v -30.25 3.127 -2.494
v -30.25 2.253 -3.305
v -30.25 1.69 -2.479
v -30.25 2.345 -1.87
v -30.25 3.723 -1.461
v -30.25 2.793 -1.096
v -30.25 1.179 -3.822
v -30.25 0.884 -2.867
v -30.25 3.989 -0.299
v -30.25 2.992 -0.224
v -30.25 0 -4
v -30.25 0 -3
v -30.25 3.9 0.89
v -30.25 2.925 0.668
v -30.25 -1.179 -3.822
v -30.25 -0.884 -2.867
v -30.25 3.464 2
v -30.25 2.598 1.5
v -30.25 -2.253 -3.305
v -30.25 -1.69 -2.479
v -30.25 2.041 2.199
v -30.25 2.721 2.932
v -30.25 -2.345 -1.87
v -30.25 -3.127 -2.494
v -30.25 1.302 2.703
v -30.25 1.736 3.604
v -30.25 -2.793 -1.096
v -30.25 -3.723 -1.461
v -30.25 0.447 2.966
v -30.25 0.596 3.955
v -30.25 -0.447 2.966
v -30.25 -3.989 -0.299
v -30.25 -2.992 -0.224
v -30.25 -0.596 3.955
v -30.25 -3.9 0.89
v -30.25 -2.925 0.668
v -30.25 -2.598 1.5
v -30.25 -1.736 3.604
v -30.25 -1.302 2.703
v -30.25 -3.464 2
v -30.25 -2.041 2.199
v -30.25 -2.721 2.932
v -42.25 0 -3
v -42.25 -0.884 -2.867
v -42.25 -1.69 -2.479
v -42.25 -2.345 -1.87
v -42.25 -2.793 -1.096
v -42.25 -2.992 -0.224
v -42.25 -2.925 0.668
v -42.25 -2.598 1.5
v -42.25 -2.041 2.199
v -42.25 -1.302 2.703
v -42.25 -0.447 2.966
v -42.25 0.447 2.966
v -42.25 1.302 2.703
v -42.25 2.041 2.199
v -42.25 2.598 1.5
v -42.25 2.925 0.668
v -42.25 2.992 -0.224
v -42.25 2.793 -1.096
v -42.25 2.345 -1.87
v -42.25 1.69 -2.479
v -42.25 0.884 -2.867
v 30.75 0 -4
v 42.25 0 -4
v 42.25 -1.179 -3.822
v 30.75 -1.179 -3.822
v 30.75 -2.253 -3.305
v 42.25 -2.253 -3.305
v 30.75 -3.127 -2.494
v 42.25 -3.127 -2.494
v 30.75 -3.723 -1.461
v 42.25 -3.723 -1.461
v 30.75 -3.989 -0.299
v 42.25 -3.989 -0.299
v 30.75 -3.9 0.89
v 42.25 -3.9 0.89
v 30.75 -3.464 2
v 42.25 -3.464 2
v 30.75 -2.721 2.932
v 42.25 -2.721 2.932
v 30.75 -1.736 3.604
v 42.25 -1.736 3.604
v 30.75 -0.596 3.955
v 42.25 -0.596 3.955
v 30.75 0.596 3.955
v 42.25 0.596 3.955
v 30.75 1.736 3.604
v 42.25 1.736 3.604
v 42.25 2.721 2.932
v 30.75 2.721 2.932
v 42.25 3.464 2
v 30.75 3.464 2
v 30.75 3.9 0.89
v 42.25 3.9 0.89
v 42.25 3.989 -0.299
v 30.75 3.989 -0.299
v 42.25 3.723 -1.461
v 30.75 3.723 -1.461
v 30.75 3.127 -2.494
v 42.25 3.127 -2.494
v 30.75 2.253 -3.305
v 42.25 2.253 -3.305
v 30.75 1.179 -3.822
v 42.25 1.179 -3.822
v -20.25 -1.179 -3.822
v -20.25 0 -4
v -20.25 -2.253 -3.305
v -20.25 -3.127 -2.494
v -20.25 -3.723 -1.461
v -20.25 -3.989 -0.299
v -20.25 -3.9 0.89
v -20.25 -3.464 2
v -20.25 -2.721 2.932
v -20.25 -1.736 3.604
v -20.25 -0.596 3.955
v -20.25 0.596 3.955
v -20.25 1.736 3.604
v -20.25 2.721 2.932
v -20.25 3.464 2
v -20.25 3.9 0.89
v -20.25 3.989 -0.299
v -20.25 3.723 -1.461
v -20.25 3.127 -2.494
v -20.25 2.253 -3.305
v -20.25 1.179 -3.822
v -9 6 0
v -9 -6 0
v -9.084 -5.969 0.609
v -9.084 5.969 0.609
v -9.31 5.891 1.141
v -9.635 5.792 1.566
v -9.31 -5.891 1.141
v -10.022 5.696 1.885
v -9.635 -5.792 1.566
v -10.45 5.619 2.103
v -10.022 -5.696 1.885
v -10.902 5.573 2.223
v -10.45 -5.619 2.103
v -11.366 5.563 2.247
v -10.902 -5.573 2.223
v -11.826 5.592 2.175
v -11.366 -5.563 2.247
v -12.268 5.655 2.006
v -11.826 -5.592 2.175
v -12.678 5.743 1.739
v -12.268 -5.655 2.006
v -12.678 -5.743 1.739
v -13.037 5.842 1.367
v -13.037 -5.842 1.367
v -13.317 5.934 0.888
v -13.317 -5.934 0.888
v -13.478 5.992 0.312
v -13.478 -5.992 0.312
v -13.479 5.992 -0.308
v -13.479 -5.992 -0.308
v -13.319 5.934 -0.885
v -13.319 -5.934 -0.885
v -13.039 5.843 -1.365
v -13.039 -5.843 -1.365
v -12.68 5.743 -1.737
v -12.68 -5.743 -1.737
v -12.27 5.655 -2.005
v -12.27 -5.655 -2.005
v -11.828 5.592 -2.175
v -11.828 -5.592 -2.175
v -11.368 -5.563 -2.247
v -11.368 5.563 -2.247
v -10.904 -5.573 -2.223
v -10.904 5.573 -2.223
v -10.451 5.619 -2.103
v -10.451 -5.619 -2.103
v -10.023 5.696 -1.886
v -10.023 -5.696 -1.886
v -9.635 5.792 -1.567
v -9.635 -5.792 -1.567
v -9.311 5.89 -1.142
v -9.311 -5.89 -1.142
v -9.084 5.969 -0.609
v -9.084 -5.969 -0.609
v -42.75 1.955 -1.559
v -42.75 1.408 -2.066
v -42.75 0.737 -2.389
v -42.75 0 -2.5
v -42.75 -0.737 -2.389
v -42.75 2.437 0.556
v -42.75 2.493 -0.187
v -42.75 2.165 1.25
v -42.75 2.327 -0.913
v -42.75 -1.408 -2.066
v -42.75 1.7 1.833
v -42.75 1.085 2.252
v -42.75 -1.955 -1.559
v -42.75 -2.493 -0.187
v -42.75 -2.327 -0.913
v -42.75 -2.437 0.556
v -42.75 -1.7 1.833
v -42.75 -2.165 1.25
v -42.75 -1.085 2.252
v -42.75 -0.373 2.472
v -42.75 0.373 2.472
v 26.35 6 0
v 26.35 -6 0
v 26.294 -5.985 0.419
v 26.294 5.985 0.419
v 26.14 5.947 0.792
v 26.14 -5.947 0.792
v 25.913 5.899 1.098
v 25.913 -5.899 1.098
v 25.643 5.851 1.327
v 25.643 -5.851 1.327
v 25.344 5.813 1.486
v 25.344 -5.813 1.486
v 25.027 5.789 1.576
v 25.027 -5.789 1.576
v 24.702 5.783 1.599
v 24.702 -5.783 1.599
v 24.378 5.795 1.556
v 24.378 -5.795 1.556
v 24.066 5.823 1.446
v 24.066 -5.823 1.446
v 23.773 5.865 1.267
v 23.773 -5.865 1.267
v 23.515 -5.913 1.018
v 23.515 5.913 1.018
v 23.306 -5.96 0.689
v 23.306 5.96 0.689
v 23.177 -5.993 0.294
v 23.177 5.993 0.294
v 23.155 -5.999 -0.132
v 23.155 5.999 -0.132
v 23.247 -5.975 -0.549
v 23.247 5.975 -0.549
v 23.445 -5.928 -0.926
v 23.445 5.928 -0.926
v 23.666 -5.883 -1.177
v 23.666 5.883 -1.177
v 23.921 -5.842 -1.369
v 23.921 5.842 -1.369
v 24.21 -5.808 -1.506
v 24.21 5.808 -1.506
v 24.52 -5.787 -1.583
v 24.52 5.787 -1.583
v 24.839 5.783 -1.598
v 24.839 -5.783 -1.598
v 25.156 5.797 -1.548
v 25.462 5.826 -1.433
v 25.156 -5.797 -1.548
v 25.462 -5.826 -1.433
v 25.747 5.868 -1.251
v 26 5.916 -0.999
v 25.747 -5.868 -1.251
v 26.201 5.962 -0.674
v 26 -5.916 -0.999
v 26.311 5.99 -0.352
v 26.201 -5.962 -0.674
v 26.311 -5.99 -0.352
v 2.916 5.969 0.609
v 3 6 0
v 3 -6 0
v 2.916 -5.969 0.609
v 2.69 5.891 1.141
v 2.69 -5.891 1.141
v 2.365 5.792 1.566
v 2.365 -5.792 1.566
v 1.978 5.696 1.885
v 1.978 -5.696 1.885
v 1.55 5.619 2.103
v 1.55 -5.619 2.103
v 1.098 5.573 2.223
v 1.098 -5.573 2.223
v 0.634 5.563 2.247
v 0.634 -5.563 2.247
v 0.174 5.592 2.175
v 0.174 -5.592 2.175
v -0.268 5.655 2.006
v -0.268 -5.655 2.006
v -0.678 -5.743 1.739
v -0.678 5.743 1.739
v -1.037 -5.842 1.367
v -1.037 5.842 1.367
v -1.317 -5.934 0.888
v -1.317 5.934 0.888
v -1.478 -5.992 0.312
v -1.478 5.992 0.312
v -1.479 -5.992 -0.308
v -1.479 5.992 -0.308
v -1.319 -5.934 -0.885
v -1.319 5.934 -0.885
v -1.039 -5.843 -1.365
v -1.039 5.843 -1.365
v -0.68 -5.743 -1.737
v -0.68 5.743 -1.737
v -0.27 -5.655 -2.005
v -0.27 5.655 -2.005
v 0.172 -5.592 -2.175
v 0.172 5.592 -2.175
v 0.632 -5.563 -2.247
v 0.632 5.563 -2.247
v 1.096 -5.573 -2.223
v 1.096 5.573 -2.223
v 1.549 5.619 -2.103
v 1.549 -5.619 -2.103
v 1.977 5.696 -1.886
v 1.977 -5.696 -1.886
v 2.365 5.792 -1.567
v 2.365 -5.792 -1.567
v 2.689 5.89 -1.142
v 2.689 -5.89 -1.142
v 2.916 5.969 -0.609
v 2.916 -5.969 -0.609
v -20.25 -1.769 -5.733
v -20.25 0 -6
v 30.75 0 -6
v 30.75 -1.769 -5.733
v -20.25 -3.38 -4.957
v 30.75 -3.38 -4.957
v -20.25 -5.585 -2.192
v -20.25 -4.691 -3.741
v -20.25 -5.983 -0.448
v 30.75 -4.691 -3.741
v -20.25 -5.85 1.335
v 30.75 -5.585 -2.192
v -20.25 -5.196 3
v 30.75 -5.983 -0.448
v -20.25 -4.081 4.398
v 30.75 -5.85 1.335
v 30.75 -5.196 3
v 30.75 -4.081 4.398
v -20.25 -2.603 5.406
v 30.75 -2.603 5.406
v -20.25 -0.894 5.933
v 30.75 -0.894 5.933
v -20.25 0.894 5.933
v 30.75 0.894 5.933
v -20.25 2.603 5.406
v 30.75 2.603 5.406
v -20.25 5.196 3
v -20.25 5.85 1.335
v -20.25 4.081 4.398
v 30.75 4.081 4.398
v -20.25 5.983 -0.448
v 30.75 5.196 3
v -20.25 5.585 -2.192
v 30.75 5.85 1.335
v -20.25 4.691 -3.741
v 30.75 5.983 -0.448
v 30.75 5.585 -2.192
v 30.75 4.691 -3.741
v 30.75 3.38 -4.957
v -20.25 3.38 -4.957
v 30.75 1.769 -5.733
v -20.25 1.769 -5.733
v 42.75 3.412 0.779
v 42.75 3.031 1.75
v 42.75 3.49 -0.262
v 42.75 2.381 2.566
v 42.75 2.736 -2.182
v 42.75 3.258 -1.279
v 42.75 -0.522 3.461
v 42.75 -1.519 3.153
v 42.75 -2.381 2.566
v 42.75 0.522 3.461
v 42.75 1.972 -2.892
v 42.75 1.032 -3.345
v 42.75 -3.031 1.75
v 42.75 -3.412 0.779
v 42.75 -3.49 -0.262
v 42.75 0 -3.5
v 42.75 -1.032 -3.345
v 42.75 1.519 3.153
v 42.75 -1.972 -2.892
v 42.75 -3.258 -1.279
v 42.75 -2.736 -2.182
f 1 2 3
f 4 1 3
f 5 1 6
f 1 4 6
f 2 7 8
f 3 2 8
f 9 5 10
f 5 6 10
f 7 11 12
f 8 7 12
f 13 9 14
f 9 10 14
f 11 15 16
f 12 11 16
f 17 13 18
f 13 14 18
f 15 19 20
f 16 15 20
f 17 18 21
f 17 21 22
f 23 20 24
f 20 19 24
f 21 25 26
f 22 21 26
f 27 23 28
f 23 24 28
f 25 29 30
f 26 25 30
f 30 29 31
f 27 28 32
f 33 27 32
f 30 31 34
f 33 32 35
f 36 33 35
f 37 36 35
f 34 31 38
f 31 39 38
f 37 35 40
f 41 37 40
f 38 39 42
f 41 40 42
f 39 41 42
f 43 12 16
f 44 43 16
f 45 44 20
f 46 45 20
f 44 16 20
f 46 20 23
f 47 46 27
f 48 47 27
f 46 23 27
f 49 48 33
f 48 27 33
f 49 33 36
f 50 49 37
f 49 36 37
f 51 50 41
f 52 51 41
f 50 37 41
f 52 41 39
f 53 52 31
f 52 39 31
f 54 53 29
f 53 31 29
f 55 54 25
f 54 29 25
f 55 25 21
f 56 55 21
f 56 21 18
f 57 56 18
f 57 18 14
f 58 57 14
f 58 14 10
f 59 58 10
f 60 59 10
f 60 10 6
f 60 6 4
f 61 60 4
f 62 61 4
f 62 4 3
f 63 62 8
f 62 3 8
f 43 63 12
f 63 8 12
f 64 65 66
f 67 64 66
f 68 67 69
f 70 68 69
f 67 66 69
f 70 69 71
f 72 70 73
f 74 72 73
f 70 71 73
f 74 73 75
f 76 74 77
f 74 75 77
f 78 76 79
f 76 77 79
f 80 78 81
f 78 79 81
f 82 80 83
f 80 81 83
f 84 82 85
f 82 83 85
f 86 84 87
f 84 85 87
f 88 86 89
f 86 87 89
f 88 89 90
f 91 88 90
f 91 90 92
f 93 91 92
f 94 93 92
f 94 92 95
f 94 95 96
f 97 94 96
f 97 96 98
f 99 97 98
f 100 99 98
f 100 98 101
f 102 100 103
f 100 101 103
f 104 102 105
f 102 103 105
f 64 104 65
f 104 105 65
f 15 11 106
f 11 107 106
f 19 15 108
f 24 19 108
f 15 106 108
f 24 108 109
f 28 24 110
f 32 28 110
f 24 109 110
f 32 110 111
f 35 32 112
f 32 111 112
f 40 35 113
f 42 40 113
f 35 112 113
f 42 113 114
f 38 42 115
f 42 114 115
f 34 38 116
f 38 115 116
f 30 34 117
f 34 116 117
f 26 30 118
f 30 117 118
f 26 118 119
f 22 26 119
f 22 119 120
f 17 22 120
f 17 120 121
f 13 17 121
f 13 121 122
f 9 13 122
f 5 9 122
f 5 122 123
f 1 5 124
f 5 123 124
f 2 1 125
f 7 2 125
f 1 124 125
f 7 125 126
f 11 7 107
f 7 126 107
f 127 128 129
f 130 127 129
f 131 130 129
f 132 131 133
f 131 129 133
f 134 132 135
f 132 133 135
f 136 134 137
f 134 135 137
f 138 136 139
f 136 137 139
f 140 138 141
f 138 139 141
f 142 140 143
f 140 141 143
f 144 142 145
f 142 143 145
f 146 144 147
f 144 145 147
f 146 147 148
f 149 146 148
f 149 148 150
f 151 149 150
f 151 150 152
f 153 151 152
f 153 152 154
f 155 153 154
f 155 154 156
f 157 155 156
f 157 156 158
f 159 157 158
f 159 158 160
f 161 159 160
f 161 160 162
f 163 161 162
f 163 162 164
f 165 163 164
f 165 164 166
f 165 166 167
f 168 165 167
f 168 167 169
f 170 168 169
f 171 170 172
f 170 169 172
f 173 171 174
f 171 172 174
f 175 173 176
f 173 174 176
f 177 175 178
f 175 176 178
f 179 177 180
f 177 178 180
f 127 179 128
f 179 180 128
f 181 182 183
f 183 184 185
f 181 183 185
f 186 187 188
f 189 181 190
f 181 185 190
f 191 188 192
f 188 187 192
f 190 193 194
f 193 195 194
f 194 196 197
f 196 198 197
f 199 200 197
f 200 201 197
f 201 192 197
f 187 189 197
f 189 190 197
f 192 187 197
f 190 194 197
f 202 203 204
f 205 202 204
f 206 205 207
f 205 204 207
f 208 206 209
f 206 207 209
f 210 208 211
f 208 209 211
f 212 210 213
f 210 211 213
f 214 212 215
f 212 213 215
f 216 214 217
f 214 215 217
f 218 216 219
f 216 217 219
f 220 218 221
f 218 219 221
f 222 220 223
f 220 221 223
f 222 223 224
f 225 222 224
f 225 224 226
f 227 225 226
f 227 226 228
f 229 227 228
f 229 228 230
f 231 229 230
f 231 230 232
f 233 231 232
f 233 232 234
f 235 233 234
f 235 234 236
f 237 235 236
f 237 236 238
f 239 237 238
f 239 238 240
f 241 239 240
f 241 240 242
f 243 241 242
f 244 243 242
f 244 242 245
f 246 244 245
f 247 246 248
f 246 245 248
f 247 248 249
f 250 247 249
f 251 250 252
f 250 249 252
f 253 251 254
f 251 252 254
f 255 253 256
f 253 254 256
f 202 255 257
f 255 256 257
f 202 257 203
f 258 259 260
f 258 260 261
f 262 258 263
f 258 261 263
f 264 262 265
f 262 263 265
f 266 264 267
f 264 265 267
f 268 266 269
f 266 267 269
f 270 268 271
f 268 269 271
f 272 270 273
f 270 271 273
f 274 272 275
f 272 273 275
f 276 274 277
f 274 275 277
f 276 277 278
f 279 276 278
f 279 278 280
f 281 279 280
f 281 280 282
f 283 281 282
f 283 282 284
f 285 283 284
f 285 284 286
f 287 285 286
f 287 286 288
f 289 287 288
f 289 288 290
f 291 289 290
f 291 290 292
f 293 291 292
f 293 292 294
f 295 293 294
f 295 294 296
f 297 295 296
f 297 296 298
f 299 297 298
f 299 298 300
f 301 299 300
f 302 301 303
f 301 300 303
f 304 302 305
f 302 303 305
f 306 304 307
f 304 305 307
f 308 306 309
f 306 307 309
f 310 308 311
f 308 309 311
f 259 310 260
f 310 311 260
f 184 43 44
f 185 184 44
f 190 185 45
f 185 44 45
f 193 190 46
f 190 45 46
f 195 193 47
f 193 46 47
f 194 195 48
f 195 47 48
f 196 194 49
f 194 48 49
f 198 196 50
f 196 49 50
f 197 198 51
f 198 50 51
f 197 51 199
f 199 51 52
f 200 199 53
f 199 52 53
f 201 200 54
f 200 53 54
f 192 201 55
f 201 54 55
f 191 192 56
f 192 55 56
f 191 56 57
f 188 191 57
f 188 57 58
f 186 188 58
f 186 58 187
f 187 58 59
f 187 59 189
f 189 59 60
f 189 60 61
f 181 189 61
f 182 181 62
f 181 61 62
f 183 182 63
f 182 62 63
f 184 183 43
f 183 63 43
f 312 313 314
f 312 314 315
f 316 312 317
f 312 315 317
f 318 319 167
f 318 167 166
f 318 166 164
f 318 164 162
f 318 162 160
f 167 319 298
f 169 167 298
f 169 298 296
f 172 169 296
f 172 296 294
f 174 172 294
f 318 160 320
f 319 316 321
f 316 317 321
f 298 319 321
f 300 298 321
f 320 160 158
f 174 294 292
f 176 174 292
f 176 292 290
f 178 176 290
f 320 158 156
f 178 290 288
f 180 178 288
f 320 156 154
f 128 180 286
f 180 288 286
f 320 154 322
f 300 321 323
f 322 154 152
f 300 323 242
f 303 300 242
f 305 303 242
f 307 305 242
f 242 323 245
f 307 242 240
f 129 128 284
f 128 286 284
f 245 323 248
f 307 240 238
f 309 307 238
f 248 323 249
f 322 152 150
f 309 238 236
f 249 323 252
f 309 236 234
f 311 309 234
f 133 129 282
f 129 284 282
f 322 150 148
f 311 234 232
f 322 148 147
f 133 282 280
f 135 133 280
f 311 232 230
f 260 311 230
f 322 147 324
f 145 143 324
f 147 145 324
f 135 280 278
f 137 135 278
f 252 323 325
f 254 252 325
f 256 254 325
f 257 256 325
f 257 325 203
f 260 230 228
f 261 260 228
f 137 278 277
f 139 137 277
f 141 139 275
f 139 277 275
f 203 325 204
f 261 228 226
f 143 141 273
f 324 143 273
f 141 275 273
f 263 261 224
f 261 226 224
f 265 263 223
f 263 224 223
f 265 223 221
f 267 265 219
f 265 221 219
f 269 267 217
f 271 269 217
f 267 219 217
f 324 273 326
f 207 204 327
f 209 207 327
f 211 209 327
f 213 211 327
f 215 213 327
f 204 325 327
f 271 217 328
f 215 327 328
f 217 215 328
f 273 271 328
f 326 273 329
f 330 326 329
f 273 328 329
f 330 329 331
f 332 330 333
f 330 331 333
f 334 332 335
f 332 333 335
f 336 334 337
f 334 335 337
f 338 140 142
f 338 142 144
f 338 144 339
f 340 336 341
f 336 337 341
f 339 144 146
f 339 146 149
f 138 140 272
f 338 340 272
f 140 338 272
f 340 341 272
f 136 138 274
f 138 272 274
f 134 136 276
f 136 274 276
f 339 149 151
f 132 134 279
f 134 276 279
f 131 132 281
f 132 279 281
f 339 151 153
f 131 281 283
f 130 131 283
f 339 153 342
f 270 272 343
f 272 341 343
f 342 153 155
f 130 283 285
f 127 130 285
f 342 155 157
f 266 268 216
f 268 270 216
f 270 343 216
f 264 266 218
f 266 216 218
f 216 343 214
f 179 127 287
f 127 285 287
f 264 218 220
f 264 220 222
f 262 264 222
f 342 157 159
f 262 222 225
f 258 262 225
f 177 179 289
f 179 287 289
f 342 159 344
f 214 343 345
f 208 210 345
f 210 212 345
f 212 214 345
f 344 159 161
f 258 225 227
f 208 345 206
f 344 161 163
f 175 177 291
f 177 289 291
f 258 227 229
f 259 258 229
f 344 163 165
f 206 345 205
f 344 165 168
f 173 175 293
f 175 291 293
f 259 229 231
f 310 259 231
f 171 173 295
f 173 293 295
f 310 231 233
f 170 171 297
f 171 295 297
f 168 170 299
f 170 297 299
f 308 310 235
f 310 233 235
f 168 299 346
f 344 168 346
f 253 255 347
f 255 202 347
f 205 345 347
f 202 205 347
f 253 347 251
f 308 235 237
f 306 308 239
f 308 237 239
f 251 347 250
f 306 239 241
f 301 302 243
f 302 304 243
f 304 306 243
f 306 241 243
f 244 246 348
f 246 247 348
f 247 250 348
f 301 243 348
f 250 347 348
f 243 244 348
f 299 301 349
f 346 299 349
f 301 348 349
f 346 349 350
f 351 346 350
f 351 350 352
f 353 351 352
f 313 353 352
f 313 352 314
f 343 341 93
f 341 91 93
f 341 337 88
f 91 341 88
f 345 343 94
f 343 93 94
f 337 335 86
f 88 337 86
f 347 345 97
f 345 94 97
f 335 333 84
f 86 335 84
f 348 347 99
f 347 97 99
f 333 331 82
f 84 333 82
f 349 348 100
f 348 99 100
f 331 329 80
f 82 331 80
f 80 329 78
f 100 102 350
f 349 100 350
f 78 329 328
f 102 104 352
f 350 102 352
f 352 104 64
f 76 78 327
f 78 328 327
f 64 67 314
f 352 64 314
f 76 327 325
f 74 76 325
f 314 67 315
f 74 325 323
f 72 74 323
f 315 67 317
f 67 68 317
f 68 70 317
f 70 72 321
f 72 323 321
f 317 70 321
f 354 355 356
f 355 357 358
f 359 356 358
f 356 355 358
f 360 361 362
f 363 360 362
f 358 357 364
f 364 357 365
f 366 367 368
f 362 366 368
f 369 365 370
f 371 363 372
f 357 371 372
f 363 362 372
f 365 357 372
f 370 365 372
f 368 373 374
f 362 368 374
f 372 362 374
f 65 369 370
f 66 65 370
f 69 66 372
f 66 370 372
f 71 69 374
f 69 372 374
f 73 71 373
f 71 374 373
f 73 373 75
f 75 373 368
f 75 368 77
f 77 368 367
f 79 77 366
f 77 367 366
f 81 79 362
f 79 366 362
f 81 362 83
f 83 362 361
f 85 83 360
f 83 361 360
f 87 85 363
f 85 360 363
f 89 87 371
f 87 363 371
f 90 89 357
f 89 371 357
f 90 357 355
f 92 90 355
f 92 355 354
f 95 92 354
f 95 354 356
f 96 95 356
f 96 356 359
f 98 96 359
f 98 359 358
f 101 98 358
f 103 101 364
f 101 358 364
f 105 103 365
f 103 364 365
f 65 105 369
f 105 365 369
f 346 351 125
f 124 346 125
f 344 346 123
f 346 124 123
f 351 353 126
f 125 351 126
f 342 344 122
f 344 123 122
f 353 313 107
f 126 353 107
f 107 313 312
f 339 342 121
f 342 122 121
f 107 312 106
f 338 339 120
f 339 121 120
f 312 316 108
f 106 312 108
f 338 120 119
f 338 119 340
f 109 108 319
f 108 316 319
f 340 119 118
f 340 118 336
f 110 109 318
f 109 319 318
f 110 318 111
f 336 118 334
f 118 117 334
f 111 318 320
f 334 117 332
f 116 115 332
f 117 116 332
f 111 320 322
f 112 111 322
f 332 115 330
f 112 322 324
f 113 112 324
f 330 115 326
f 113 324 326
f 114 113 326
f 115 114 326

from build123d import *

# Parameters (mm, degrees)
CHAFL_N1_SIZE                = 0.5
TALADRO_DE_MARGEN_PARA_M41_D = 4.5
TALADRO_DE_MARGEN_PARA_M31_D = 3.2


with BuildPart() as part:
    # Croquis1 → Revolución1 (revolve)
    with BuildSketch(Plane(origin=(0, 0, 0), x_dir=(-1, 0, 0), z_dir=(0, 1, 0)), mode=Mode.PRIVATE) as revoluci_n1_sk:
        Polygon((-42.75, 0), (42.75, 0), (42.75, 3), (30.25, 3), (30.25, 4), (20.25, 4), (20.25, 6), (-30.75, 6), (-30.75, 4), (-42.75, 4), align=None)
    revolve(revoluci_n1_sk.sketch.rotate(Axis((42.75, 0, 0), (-1, 0, 0)), 180), axis=Axis((42.75, 0, 0), (-1, 0, 0)))

    # Chaflán1
    chafl_n1_edges = [part.edges().sort_by_distance(p)[0] for p in [
        (-42.75, 0, 3),
        (42.75, 0, 4),
    ]]
    chamfer(chafl_n1_edges, length=CHAFL_N1_SIZE)

    # Taladro de margen para M41 (through all)
    with Locations(Plane(origin=(0, 10, 0), x_dir=(-1, 0, 0), z_dir=(0, 1, 0))):
        with Locations((11.25, 0), (-0.75, 0)):
            Hole(TALADRO_DE_MARGEN_PARA_M41_D / 2)

    # Taladro de margen para M31 (through all)
    with Locations(Plane(origin=(0, 10, 0), x_dir=(-1, 0, 0), z_dir=(0, 1, 0))):
        with Locations((-24.75, 0)):
            Hole(TALADRO_DE_MARGEN_PARA_M31_D / 2)


solid = part.part
